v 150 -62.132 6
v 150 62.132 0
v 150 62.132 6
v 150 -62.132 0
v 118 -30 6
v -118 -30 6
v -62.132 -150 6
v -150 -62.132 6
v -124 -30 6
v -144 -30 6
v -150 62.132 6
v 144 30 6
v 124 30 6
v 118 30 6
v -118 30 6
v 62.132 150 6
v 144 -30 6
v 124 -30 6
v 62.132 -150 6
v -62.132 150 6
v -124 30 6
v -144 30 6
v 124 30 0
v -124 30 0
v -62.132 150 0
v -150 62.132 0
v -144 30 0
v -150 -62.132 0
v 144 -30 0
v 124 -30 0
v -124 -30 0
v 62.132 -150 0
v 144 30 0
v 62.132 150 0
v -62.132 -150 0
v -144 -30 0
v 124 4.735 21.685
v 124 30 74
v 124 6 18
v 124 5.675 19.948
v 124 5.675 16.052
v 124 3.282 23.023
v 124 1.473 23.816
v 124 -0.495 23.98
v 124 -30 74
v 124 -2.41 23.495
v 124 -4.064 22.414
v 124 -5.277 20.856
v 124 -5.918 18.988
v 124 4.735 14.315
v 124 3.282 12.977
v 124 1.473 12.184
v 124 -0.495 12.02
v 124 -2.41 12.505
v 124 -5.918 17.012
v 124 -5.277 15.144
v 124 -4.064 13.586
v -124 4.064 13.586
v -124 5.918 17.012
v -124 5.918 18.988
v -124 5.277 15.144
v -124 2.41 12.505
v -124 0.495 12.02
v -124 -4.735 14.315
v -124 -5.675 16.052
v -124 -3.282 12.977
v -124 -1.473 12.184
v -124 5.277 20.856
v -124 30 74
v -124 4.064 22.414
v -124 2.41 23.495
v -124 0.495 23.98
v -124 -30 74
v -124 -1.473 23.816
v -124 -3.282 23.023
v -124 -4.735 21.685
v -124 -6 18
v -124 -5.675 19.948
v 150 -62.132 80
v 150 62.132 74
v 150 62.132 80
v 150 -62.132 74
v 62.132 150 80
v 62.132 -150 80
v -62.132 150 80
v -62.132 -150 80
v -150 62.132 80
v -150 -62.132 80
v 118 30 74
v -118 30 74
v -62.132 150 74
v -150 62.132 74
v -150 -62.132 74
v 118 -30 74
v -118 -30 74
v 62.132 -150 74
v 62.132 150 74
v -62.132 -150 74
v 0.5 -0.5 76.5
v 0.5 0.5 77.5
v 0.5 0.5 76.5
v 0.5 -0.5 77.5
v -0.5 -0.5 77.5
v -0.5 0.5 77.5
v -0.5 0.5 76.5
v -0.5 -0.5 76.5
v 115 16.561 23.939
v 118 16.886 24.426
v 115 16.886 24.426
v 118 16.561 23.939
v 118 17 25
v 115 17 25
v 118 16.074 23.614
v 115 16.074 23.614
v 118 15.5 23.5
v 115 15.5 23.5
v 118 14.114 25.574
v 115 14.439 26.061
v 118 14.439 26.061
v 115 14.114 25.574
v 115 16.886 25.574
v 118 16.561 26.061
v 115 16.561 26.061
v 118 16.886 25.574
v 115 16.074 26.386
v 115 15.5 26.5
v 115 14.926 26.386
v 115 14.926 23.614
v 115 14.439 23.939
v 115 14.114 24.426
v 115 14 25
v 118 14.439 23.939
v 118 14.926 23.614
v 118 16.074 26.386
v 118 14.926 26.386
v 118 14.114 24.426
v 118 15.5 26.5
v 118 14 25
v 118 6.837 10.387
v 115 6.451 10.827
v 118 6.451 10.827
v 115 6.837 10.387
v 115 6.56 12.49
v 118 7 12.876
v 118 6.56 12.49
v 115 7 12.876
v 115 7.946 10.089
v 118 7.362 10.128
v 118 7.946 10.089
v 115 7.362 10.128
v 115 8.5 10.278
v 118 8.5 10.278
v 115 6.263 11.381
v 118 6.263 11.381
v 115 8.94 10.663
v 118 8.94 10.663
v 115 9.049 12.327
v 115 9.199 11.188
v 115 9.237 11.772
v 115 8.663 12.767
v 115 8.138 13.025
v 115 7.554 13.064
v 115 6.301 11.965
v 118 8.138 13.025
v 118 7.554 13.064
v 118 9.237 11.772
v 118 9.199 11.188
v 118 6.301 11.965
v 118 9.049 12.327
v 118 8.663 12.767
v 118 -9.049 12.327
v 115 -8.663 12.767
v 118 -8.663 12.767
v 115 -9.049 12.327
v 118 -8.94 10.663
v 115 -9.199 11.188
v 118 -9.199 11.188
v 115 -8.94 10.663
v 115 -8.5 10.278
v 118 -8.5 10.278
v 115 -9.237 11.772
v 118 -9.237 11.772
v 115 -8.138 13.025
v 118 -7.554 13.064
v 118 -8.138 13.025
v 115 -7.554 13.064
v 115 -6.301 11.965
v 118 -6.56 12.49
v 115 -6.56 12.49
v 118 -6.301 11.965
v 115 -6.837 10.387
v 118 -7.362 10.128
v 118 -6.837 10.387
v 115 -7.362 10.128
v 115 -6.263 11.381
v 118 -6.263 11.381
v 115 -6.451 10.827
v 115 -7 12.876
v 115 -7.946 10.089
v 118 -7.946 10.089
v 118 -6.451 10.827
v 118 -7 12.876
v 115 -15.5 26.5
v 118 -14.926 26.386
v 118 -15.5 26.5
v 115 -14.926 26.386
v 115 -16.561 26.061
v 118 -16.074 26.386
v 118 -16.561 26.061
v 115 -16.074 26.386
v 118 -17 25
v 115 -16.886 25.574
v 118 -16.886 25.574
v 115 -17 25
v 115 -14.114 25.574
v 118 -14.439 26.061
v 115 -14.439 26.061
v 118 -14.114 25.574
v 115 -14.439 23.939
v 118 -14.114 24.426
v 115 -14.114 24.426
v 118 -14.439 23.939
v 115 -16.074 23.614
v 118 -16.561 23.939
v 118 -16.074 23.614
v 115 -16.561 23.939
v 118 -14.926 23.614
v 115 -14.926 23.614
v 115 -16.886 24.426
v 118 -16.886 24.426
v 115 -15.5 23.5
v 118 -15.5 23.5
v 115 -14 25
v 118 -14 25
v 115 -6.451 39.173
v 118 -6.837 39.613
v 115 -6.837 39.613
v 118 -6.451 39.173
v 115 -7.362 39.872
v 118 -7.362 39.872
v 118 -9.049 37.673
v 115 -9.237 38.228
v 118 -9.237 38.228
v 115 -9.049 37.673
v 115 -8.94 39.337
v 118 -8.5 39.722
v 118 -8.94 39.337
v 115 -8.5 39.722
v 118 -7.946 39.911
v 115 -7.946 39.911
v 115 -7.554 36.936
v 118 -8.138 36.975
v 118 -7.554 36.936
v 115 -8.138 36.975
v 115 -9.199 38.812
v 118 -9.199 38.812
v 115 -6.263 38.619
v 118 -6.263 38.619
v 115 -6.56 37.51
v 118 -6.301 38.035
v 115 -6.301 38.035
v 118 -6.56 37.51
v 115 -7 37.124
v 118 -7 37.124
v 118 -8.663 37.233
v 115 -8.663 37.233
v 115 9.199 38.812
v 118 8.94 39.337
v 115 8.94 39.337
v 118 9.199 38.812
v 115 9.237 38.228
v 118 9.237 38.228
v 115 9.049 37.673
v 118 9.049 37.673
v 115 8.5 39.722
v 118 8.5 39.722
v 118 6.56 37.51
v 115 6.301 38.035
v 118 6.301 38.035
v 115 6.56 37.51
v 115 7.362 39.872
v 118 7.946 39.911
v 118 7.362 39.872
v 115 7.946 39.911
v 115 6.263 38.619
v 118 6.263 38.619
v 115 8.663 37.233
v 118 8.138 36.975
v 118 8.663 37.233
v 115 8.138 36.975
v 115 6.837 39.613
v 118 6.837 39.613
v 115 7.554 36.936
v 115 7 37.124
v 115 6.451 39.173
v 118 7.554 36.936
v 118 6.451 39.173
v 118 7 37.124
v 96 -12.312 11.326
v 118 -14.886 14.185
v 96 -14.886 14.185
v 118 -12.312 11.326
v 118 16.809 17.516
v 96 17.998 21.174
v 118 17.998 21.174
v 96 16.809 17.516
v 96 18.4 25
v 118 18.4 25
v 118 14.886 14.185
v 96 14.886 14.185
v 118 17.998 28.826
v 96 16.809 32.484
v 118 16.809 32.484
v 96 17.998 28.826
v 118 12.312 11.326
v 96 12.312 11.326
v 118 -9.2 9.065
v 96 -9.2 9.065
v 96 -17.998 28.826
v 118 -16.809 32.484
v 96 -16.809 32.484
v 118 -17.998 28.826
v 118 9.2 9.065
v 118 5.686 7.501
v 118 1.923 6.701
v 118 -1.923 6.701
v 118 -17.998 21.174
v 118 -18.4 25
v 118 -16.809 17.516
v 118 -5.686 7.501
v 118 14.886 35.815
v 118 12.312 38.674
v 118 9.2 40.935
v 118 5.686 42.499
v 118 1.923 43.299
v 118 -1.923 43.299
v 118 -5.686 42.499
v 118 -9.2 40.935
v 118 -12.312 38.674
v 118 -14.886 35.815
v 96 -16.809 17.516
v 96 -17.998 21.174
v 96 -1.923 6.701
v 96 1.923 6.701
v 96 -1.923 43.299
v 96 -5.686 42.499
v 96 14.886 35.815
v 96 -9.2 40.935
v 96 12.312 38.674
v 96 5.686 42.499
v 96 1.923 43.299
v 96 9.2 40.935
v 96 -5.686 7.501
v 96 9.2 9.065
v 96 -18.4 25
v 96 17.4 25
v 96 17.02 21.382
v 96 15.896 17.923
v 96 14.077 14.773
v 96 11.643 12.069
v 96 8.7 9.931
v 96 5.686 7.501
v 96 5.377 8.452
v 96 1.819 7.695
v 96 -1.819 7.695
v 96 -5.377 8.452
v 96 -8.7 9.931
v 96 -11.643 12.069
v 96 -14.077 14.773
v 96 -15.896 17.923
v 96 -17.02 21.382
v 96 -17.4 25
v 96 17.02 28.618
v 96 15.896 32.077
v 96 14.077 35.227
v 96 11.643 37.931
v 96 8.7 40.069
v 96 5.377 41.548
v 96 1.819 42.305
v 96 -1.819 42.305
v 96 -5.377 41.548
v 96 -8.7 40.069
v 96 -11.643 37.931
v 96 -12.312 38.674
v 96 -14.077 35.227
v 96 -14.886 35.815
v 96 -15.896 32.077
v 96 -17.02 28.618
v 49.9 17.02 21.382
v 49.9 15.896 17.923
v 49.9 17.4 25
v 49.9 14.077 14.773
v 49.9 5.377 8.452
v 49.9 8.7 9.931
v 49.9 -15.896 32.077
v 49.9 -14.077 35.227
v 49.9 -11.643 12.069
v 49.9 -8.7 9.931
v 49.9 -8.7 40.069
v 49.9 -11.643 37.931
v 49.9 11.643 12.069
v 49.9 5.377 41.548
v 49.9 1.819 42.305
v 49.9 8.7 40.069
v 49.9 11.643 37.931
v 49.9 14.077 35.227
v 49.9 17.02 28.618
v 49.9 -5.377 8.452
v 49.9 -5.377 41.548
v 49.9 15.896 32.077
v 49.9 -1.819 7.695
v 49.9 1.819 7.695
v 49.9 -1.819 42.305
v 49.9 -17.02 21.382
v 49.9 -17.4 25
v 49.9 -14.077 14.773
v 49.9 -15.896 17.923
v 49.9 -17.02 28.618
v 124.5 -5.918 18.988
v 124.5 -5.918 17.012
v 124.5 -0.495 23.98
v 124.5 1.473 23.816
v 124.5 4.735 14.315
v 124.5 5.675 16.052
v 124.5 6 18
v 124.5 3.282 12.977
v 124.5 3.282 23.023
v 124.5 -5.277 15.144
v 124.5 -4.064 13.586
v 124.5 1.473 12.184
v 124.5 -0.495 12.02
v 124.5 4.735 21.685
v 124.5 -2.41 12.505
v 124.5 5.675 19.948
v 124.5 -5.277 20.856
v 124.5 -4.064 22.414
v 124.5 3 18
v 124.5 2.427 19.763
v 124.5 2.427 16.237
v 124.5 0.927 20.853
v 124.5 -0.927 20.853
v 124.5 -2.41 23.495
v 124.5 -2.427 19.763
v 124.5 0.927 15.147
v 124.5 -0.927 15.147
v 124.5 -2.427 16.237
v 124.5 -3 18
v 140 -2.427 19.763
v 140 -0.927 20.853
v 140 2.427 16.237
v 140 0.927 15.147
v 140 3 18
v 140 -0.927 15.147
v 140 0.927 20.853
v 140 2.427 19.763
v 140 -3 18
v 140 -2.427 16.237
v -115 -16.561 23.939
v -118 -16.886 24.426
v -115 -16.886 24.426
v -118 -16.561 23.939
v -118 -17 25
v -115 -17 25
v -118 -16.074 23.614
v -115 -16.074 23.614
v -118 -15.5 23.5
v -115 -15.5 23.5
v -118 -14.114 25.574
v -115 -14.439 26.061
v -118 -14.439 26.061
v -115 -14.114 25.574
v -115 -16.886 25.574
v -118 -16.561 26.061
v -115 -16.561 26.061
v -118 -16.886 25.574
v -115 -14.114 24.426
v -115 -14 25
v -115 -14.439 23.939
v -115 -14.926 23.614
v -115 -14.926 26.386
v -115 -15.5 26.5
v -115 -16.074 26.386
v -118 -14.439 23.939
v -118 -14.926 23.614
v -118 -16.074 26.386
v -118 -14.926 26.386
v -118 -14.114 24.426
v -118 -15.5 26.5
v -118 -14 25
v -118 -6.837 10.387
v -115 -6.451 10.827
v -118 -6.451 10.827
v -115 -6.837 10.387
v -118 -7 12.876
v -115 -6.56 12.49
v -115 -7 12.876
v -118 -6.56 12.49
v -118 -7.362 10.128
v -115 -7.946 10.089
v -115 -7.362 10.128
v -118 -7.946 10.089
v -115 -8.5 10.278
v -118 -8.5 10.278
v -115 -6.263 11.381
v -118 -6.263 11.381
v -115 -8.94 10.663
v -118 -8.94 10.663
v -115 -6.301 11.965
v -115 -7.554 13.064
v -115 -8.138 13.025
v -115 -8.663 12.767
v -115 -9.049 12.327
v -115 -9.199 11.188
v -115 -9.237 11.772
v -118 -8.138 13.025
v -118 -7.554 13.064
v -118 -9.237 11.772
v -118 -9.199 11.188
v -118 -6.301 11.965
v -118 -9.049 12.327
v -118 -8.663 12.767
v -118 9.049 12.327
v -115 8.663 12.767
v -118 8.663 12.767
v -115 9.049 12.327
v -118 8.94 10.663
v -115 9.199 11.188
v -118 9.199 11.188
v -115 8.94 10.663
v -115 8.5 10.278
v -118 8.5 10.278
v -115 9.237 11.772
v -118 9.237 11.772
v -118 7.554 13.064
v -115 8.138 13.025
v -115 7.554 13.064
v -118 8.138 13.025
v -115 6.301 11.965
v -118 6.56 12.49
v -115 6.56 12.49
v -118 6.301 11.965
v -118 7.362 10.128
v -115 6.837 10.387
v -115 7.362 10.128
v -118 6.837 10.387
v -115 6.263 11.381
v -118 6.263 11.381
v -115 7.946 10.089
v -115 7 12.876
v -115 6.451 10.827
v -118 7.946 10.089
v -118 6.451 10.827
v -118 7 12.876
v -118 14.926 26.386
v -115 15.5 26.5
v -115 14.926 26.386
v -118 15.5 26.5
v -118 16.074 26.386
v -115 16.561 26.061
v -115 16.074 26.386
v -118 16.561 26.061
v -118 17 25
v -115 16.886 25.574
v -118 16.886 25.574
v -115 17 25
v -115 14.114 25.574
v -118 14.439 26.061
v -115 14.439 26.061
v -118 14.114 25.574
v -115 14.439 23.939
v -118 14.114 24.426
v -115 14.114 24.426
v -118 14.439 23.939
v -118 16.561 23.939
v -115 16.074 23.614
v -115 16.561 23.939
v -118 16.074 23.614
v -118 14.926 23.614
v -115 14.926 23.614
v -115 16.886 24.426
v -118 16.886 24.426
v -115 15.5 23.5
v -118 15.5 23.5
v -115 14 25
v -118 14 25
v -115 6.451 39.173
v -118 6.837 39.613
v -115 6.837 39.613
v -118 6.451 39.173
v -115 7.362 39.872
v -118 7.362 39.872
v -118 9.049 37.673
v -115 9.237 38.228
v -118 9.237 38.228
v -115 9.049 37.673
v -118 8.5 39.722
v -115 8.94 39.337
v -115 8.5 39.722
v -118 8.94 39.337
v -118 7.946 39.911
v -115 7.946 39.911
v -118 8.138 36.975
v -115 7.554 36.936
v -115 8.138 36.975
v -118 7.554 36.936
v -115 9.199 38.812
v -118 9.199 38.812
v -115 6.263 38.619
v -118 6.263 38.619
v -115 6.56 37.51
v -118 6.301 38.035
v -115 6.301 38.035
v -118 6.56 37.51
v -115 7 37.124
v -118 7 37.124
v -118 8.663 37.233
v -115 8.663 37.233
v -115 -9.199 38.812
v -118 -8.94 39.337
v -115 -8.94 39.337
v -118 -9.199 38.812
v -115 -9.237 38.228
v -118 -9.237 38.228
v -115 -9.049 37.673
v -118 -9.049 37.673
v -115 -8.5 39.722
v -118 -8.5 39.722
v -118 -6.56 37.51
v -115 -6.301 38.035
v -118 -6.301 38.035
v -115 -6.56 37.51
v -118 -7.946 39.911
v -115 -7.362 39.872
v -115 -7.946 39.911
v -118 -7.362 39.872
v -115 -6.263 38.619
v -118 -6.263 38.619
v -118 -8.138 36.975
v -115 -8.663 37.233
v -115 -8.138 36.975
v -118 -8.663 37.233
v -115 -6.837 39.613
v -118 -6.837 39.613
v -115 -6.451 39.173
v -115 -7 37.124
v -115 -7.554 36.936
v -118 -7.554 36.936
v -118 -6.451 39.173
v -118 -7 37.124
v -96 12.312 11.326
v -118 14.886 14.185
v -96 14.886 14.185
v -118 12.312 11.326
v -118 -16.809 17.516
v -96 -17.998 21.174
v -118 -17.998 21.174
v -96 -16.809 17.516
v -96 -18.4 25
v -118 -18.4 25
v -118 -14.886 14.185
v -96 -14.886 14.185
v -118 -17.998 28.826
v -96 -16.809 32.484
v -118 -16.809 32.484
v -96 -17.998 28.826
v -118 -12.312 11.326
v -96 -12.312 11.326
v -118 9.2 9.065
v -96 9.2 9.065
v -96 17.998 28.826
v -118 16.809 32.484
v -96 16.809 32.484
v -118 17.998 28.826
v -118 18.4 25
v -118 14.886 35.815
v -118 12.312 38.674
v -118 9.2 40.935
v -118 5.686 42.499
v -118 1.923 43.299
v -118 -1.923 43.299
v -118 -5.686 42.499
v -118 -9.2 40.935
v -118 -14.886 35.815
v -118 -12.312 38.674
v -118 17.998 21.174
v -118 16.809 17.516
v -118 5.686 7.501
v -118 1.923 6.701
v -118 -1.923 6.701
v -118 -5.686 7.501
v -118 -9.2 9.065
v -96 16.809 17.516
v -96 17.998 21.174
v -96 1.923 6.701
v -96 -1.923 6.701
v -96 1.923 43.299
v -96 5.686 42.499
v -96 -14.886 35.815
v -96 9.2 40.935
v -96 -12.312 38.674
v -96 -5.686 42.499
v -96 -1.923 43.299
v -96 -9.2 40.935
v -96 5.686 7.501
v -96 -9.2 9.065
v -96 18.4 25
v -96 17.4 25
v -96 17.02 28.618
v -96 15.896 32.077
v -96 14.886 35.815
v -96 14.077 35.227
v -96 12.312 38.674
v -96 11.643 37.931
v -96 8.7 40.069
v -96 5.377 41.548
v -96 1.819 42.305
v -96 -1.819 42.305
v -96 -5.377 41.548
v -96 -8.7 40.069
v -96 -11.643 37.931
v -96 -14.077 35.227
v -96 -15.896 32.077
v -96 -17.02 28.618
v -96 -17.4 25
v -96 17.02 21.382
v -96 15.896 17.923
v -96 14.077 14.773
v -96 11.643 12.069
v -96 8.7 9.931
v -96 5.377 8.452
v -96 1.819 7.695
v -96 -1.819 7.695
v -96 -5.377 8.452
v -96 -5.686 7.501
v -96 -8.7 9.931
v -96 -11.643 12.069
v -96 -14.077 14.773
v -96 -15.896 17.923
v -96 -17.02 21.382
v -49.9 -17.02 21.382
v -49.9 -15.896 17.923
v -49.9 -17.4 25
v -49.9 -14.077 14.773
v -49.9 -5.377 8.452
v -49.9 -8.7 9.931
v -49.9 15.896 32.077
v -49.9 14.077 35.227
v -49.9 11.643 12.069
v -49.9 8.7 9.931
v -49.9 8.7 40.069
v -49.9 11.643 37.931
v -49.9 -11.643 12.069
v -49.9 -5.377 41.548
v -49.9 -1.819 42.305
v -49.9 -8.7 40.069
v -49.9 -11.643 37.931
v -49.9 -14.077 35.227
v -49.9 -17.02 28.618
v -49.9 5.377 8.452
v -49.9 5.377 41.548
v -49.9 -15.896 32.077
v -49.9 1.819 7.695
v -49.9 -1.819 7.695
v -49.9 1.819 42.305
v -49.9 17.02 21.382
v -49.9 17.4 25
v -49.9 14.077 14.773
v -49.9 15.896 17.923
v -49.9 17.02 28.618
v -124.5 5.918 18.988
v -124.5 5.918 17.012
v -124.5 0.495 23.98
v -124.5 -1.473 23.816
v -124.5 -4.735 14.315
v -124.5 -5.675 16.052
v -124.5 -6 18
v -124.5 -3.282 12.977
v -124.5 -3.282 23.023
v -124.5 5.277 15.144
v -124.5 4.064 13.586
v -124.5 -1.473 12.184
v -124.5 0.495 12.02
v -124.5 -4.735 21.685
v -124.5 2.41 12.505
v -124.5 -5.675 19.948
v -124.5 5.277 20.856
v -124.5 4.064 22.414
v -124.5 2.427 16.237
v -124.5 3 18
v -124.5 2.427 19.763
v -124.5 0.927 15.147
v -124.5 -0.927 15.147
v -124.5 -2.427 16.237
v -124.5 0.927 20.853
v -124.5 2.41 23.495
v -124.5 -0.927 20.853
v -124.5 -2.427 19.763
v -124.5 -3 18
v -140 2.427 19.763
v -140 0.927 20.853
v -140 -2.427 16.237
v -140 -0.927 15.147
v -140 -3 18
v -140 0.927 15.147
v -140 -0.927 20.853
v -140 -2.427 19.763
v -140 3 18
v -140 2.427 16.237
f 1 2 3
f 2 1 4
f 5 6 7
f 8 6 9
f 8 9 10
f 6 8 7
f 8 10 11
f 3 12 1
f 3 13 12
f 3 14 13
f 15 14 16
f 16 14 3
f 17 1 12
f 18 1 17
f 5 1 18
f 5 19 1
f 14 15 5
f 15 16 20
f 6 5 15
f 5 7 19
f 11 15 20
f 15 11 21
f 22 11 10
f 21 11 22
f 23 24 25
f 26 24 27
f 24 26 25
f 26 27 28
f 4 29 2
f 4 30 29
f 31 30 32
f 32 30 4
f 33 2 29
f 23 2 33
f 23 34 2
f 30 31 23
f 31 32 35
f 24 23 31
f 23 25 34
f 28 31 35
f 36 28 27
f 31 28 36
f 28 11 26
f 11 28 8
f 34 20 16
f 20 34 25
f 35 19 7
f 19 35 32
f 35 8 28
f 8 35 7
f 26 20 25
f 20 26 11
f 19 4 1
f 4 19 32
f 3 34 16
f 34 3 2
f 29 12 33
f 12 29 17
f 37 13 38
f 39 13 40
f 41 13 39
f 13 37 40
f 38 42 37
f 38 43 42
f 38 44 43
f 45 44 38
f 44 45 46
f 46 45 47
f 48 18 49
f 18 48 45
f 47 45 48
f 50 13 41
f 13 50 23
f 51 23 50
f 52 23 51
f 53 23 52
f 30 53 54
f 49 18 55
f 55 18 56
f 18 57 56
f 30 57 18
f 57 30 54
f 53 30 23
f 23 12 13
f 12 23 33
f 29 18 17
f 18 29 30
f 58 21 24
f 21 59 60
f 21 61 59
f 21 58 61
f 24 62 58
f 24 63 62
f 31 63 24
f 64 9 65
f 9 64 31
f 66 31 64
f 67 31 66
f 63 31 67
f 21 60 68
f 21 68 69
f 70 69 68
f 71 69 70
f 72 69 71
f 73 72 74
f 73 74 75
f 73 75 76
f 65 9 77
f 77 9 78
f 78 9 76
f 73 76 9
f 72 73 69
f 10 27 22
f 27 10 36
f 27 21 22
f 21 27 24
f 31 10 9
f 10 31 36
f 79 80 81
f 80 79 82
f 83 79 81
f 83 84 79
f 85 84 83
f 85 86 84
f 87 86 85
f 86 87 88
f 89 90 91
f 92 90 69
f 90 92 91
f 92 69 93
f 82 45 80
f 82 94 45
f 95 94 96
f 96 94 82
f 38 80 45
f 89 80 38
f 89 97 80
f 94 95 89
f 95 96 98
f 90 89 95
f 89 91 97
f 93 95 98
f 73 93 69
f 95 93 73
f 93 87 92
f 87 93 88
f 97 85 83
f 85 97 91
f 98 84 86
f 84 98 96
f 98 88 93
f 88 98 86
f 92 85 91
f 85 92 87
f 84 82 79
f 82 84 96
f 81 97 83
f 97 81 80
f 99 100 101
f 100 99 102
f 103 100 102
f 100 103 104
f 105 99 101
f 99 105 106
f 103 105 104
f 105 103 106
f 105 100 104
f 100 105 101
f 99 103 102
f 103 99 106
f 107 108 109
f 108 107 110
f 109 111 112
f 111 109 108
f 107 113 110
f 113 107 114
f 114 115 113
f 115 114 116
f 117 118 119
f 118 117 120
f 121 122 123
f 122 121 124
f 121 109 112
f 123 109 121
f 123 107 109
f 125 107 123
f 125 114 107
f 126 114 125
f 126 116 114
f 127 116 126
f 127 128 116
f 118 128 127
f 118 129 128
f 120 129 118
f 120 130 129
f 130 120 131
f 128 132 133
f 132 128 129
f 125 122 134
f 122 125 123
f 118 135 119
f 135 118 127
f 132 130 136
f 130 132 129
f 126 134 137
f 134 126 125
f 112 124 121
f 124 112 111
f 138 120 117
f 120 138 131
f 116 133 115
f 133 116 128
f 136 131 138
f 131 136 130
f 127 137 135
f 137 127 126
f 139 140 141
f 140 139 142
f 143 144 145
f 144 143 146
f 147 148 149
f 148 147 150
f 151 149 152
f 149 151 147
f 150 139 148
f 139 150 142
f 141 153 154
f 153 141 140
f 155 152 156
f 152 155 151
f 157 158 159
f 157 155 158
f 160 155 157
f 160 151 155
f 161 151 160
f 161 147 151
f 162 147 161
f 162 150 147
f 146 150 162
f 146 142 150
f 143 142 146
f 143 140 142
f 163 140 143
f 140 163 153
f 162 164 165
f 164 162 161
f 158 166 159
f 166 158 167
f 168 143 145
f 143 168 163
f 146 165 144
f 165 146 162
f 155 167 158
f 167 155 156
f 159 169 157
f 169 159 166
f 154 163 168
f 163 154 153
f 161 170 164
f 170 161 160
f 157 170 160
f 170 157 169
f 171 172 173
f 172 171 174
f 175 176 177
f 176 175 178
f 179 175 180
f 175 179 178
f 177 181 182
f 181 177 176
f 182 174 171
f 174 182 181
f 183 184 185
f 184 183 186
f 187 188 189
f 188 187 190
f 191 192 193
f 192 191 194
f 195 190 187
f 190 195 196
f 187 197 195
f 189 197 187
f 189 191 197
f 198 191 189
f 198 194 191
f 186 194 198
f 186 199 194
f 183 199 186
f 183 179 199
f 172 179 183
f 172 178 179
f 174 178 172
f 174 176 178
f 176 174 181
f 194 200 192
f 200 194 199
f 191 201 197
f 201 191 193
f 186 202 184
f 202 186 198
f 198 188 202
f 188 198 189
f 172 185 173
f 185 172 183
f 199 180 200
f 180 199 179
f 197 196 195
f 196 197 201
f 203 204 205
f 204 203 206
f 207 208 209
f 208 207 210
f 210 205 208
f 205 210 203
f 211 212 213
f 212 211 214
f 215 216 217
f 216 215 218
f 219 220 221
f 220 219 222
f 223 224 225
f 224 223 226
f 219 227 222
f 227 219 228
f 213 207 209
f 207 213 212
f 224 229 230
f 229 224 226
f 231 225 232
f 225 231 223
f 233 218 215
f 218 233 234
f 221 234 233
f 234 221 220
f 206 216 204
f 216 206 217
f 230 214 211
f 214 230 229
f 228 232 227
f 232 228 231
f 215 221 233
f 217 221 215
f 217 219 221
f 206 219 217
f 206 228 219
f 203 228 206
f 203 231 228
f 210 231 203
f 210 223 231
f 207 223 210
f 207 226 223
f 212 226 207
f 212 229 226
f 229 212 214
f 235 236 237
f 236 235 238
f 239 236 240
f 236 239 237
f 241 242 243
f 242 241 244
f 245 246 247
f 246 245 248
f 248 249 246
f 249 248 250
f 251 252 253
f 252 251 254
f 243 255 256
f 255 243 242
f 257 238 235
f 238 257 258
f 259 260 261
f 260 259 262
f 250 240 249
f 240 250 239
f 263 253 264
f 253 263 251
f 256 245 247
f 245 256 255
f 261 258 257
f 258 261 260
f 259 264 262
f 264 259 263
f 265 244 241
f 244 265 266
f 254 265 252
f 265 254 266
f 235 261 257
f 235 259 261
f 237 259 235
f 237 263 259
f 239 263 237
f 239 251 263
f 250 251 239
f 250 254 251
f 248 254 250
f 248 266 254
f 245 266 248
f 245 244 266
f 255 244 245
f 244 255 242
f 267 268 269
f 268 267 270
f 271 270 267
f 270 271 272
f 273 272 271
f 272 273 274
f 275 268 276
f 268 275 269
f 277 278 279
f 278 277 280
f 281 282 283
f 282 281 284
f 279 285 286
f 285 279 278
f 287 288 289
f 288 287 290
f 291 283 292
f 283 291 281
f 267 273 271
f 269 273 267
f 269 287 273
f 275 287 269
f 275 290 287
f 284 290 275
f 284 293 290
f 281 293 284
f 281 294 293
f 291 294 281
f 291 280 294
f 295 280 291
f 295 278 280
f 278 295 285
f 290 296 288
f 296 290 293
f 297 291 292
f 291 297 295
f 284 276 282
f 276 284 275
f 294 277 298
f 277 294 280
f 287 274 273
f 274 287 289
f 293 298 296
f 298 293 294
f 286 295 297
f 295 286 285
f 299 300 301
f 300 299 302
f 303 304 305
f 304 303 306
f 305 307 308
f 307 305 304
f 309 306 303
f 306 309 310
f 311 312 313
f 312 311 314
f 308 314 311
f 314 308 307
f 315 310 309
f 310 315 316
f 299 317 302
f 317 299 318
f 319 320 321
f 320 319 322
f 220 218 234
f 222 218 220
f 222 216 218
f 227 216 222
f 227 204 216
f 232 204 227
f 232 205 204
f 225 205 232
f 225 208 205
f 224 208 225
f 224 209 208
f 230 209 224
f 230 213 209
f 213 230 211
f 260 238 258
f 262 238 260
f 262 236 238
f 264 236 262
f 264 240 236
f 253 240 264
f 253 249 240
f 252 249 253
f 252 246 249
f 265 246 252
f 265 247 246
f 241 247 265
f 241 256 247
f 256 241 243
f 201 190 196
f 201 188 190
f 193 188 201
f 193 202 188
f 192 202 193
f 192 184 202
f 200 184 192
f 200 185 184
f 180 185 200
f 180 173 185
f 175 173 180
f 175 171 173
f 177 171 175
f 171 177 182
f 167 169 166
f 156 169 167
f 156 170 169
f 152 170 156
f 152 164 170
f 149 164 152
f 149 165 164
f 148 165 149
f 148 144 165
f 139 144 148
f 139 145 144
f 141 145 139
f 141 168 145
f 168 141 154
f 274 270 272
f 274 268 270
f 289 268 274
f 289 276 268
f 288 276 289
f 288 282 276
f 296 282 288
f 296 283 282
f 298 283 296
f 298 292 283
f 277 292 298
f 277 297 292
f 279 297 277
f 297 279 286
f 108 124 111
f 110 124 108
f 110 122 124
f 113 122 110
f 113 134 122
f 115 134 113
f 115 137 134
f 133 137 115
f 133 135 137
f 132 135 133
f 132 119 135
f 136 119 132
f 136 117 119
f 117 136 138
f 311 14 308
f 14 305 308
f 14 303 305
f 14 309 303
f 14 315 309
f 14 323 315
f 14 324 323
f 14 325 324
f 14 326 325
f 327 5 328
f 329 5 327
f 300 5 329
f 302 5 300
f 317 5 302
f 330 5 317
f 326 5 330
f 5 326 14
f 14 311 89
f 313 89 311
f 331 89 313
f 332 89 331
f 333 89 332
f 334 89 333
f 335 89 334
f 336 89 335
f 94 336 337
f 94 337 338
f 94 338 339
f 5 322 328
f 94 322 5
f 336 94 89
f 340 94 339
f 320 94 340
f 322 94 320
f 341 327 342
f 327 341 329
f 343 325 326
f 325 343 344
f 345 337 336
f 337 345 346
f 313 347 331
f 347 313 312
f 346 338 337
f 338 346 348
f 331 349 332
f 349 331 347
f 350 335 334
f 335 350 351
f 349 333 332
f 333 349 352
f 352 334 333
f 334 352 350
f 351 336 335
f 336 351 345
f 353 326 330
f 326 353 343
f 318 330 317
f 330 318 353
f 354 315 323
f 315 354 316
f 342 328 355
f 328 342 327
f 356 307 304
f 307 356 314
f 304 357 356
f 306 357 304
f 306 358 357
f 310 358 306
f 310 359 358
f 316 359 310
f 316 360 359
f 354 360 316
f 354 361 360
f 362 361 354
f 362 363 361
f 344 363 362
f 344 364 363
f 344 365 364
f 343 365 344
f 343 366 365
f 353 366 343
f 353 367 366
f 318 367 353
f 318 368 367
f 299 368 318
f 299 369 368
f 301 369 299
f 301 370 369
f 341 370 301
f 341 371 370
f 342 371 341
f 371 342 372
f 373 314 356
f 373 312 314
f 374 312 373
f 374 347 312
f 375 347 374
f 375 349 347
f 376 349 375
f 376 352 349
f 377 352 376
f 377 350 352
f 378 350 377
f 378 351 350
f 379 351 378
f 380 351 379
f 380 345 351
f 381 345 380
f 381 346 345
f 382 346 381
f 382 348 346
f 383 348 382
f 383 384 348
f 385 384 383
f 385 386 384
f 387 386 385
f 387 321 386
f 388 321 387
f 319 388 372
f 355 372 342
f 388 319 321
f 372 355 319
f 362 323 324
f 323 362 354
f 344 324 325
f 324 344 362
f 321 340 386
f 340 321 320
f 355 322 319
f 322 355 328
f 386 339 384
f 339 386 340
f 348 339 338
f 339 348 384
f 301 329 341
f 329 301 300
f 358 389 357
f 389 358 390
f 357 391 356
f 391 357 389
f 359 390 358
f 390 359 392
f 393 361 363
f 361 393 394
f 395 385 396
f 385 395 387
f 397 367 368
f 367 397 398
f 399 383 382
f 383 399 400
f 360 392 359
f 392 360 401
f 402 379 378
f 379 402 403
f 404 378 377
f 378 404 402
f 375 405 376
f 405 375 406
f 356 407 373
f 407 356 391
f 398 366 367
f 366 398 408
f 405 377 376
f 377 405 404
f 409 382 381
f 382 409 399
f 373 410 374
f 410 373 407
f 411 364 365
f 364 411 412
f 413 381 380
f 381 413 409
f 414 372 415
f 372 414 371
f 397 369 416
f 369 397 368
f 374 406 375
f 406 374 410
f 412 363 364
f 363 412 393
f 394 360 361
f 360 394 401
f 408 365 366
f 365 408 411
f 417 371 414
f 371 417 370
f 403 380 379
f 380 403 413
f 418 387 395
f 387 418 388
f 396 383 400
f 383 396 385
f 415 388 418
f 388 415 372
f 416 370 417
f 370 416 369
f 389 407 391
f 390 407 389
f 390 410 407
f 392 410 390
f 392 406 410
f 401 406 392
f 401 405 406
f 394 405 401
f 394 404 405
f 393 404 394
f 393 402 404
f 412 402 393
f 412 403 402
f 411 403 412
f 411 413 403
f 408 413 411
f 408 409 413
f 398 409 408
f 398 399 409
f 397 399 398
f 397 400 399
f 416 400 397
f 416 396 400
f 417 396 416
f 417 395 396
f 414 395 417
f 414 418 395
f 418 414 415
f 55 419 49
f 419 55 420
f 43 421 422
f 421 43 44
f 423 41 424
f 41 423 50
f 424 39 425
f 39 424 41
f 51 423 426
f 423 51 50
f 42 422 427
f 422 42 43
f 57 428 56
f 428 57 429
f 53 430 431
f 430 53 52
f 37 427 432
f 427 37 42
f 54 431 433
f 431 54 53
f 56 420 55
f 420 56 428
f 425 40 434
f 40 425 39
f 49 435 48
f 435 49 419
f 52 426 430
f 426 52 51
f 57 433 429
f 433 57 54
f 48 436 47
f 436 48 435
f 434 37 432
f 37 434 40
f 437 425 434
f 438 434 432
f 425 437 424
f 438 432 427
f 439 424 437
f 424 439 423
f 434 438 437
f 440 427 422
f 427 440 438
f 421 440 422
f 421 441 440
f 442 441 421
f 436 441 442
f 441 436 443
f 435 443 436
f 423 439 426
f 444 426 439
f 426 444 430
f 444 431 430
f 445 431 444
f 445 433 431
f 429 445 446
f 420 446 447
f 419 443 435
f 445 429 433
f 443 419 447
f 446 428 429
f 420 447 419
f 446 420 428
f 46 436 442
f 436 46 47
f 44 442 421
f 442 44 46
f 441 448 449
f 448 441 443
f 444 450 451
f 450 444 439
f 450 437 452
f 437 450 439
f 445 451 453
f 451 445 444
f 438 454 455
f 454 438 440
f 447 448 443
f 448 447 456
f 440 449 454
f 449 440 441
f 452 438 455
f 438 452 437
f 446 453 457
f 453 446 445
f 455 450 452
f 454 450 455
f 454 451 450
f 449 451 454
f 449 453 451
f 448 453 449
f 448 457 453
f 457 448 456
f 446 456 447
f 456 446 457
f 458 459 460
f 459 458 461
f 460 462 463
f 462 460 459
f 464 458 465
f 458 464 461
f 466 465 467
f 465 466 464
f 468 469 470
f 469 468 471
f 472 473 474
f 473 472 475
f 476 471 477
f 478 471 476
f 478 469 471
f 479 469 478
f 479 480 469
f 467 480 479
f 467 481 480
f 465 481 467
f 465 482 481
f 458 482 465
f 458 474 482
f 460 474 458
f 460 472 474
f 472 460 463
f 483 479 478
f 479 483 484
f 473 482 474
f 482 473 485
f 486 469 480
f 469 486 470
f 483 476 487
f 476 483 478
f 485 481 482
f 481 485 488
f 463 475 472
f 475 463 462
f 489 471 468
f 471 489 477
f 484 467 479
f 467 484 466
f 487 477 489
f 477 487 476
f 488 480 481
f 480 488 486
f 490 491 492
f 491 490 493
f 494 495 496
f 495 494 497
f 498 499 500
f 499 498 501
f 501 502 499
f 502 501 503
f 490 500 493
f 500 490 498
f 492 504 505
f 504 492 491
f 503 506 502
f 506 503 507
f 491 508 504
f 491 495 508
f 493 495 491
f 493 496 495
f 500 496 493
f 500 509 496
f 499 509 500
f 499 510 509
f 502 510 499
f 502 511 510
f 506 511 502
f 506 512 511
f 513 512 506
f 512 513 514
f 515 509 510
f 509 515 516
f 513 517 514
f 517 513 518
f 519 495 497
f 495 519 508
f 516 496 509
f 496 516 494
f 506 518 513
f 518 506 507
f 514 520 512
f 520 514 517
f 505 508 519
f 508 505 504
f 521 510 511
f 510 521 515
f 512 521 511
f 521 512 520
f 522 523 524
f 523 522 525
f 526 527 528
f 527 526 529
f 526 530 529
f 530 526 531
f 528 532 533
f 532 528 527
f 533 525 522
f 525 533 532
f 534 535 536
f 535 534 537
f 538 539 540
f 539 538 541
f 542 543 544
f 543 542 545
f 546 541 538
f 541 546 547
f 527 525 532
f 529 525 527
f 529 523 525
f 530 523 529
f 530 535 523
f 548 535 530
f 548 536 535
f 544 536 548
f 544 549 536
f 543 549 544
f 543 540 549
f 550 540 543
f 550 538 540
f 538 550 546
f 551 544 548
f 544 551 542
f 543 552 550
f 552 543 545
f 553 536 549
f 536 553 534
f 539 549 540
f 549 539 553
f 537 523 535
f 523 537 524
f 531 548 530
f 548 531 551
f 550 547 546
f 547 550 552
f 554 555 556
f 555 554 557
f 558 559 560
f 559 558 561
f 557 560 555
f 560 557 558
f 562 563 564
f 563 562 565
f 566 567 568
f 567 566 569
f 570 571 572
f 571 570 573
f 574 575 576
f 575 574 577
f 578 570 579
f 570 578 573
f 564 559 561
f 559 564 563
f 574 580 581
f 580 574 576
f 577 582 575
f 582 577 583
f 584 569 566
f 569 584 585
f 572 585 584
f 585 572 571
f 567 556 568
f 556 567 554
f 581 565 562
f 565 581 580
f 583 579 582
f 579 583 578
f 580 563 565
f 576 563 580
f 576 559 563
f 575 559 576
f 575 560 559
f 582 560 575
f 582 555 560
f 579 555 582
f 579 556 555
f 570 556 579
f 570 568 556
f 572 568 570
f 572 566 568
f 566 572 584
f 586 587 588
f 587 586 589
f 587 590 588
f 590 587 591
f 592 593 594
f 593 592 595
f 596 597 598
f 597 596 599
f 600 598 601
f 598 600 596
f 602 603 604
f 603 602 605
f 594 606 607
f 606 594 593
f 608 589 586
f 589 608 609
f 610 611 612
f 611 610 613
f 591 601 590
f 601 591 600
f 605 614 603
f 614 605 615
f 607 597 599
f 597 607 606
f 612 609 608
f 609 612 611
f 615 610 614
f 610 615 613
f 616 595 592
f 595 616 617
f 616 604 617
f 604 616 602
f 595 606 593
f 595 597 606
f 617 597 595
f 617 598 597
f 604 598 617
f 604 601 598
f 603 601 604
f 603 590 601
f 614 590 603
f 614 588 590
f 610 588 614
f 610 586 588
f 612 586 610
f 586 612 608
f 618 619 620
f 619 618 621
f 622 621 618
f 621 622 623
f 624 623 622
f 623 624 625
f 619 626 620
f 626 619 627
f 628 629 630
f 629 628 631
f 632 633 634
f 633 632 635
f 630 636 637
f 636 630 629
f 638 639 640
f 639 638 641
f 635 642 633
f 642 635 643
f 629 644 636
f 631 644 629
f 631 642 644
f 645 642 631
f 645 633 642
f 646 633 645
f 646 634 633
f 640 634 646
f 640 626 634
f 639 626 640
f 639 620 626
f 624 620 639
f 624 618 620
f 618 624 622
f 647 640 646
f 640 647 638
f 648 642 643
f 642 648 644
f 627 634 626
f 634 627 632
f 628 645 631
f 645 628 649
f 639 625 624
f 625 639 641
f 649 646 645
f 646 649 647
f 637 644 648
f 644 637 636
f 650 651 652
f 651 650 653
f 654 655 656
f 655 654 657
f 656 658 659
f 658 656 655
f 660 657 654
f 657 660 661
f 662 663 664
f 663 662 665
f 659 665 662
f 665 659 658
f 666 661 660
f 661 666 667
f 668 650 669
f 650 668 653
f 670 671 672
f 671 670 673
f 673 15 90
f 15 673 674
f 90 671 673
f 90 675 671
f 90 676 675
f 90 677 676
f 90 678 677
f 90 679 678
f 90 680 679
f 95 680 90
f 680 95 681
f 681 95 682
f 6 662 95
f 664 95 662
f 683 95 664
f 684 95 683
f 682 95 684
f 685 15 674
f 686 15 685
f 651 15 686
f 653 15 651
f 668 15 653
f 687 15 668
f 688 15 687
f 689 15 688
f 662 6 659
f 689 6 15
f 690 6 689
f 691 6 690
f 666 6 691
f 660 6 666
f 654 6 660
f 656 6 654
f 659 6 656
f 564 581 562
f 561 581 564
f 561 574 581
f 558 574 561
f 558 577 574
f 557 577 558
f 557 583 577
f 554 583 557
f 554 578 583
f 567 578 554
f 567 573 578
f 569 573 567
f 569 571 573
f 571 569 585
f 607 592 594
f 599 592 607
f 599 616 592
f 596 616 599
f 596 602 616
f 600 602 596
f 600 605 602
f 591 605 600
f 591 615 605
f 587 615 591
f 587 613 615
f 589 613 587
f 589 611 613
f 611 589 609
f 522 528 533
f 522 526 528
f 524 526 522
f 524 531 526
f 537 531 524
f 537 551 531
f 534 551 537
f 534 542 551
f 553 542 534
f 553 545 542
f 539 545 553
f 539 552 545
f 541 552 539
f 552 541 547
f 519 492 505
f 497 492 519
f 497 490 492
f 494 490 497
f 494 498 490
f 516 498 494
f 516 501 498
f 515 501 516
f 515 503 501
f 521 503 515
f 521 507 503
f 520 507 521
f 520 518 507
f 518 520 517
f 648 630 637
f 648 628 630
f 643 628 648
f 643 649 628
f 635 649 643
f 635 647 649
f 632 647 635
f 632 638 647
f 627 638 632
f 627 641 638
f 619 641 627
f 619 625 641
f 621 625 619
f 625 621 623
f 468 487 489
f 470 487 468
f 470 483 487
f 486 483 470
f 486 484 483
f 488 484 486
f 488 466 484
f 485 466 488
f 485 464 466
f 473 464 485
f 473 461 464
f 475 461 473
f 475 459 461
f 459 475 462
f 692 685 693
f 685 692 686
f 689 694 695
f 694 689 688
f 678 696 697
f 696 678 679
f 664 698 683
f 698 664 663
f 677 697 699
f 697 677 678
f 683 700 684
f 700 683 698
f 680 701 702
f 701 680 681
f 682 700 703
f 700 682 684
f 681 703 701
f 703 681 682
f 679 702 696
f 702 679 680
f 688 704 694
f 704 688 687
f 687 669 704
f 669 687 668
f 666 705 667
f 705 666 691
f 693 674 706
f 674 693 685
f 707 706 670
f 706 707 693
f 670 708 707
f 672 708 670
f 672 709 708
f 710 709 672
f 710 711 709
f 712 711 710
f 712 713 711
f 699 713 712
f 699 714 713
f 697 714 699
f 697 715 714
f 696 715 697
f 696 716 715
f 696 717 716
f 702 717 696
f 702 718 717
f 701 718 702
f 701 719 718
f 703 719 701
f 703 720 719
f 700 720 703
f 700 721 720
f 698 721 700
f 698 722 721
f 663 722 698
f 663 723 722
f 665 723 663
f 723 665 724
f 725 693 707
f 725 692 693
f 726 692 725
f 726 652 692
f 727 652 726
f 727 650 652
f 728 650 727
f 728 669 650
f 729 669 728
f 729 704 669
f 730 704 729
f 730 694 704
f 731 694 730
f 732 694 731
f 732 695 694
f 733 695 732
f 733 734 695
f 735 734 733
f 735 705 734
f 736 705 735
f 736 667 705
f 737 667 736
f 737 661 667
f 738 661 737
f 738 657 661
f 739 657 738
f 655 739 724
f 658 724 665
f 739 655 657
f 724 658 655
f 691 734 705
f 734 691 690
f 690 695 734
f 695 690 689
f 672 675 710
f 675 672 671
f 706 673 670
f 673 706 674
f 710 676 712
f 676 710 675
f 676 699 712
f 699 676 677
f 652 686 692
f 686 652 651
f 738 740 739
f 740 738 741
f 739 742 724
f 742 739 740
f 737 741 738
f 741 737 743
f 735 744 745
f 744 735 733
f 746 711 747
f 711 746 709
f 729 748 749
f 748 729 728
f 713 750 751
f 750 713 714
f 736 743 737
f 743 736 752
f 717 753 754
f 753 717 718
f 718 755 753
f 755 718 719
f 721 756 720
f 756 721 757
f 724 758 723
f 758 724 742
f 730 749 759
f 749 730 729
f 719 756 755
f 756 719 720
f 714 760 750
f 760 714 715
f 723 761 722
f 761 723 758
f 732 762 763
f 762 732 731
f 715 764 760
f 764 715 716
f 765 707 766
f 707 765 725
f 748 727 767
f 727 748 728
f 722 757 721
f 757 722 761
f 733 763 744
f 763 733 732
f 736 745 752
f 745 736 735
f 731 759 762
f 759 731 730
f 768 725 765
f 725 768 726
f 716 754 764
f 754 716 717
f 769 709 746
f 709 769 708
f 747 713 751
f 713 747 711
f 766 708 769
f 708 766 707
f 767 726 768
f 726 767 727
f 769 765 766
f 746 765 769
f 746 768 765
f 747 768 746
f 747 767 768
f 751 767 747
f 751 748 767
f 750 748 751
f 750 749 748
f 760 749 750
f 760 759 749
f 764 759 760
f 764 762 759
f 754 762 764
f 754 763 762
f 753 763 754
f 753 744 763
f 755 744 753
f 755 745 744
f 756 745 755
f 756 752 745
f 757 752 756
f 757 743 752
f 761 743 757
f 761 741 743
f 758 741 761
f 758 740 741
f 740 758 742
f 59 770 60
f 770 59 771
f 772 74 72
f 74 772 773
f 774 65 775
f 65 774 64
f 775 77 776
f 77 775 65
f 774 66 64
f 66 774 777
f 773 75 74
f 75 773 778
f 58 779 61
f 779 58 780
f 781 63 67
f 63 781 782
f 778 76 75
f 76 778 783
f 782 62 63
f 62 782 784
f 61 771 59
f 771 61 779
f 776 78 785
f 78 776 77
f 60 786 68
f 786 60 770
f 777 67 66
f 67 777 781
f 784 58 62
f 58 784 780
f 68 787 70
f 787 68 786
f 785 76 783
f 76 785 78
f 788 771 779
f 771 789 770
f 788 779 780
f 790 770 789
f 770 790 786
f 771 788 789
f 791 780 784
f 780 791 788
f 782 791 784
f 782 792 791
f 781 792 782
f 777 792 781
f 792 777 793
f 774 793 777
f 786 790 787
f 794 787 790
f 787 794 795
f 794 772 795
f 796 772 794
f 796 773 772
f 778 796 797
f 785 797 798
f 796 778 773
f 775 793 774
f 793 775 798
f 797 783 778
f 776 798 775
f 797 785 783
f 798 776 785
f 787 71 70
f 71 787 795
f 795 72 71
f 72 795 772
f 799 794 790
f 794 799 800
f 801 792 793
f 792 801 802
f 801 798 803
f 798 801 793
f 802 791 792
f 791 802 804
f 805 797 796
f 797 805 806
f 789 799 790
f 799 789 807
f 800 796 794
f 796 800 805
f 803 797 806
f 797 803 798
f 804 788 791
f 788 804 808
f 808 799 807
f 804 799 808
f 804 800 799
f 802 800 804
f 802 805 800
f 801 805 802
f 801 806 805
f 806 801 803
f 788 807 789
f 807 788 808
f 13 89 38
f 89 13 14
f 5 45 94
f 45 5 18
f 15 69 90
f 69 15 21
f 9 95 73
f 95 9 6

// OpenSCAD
// file: ../parts/pololu_37Dx52L.scad
module pololu_37Dx52L() {
	$l_gear = 22;
	$d_gear = 36.8;
	$l_motor = 30.7;
	$d_motor = 34.8;
	$l_coder = 15.4;
	$d_coder = 34.8;
	$l_thing = 6.5;
	$d_thing = 12;
	$l_shaft = 22-$l_thing;
	$d_shaft = 6;

	rotate([90,180,-90]){
		difference() {
			translate([0,0,0]) {
				color([1,0,0])
					cylinder(h=$l_gear,d1=$d_gear,d2=$d_gear);
			}
			for(i=[0:5]) {
				rotate([0,0,i*(360/6)]) {
					translate([31/2,0,-1]) {
						cylinder(h=4,d1=3,d2=3,$fn=16);
					}
				}
			}
		}
		translate([0,0,$l_gear]) {
			color([0,1,0])
				cylinder(h=$l_motor,d1=$d_motor,d2=$d_motor);
		}
		translate([0,0,$l_gear+$l_motor]) {
			color([0,0,1])
				cylinder(h=$l_coder,d1=$d_coder,d2=$d_coder);
		}
		translate([0,7,-$l_thing]) {
			color([0,0,1])
				cylinder(h=$l_thing,d1=$d_thing,d2=$d_thing);
		}
		translate([0,7,-($l_thing+$l_shaft)]) {
			color([0,1,0])
				cylinder(h=$l_shaft,d1=$d_shaft,d2=$d_shaft);
		}
	}
}

//pololu_37Dx52L();
// file: top_plate.scad
/* Test */

module top_plate(d) {
	difference() {
		// The plate itself
		intersection() {
			cube([d,d,6], center=true);
			rotate([0,0,45]) cube([d,d,6], center=true);
		}
	}
}

//projection(cut=false) {
//    top_plate(300,60,20);
//}
// file: bottom_plate.scad
/* Test */

module bottom_plate(d,dWheel,lWheel) {
	difference() {
		// The plate itself
		intersection() {
			cube([d,d,6], center=true);
			rotate([0,0,45]) cube([d,d,6], center=true);
		}

		// Holes for wheels
		translate([d/2-lWheel/2-6,0,0]) {
			cube([lWheel,dWheel,10], center=true);
		}
		translate([-(d/2-lWheel/2-6),0,0]) {
			cube([lWheel,dWheel,10], center=true);
		}
	}
}

//projection(cut=false) {
//    bottom_plate(300,60,20);
//}
// file: motor_support.scad
module motor_support(h) {
	cube([6,60,h],center=true);
}

//projection(cut=false) {
//    motor_support(300,60,20);
//}
// main file
include <motor_support.scad>
include <bottom_plate.scad>
include <top_plate.scad>
include <../parts/pololu_37Dx52L.scad>

$d_robot = 300;
$h_robot = 80;

$d_wheel = 60;
$l_wheel = 20;

translate([0,0,3]) {
    bottom_plate($d_robot,$d_wheel,$l_wheel);
}

translate([$d_robot/2-$l_wheel-3-6,0,40]) {
    color([1,0,0])
    motor_support($h_robot);
}

translate([-($d_robot/2-$l_wheel-3-6),0,40]) {
    color([1,0,0])
    motor_support($h_robot);
}

translate([0,0,$h_robot-3]) {
    bottom_plate($d_robot);
}

translate([$d_robot/2-$l_wheel-6-6,0,25]) {
    pololu_37Dx52L();
}

rotate([0,0,180])
translate([$d_robot/2-$l_wheel-6-6,0,25]) {
    pololu_37Dx52L();
}
